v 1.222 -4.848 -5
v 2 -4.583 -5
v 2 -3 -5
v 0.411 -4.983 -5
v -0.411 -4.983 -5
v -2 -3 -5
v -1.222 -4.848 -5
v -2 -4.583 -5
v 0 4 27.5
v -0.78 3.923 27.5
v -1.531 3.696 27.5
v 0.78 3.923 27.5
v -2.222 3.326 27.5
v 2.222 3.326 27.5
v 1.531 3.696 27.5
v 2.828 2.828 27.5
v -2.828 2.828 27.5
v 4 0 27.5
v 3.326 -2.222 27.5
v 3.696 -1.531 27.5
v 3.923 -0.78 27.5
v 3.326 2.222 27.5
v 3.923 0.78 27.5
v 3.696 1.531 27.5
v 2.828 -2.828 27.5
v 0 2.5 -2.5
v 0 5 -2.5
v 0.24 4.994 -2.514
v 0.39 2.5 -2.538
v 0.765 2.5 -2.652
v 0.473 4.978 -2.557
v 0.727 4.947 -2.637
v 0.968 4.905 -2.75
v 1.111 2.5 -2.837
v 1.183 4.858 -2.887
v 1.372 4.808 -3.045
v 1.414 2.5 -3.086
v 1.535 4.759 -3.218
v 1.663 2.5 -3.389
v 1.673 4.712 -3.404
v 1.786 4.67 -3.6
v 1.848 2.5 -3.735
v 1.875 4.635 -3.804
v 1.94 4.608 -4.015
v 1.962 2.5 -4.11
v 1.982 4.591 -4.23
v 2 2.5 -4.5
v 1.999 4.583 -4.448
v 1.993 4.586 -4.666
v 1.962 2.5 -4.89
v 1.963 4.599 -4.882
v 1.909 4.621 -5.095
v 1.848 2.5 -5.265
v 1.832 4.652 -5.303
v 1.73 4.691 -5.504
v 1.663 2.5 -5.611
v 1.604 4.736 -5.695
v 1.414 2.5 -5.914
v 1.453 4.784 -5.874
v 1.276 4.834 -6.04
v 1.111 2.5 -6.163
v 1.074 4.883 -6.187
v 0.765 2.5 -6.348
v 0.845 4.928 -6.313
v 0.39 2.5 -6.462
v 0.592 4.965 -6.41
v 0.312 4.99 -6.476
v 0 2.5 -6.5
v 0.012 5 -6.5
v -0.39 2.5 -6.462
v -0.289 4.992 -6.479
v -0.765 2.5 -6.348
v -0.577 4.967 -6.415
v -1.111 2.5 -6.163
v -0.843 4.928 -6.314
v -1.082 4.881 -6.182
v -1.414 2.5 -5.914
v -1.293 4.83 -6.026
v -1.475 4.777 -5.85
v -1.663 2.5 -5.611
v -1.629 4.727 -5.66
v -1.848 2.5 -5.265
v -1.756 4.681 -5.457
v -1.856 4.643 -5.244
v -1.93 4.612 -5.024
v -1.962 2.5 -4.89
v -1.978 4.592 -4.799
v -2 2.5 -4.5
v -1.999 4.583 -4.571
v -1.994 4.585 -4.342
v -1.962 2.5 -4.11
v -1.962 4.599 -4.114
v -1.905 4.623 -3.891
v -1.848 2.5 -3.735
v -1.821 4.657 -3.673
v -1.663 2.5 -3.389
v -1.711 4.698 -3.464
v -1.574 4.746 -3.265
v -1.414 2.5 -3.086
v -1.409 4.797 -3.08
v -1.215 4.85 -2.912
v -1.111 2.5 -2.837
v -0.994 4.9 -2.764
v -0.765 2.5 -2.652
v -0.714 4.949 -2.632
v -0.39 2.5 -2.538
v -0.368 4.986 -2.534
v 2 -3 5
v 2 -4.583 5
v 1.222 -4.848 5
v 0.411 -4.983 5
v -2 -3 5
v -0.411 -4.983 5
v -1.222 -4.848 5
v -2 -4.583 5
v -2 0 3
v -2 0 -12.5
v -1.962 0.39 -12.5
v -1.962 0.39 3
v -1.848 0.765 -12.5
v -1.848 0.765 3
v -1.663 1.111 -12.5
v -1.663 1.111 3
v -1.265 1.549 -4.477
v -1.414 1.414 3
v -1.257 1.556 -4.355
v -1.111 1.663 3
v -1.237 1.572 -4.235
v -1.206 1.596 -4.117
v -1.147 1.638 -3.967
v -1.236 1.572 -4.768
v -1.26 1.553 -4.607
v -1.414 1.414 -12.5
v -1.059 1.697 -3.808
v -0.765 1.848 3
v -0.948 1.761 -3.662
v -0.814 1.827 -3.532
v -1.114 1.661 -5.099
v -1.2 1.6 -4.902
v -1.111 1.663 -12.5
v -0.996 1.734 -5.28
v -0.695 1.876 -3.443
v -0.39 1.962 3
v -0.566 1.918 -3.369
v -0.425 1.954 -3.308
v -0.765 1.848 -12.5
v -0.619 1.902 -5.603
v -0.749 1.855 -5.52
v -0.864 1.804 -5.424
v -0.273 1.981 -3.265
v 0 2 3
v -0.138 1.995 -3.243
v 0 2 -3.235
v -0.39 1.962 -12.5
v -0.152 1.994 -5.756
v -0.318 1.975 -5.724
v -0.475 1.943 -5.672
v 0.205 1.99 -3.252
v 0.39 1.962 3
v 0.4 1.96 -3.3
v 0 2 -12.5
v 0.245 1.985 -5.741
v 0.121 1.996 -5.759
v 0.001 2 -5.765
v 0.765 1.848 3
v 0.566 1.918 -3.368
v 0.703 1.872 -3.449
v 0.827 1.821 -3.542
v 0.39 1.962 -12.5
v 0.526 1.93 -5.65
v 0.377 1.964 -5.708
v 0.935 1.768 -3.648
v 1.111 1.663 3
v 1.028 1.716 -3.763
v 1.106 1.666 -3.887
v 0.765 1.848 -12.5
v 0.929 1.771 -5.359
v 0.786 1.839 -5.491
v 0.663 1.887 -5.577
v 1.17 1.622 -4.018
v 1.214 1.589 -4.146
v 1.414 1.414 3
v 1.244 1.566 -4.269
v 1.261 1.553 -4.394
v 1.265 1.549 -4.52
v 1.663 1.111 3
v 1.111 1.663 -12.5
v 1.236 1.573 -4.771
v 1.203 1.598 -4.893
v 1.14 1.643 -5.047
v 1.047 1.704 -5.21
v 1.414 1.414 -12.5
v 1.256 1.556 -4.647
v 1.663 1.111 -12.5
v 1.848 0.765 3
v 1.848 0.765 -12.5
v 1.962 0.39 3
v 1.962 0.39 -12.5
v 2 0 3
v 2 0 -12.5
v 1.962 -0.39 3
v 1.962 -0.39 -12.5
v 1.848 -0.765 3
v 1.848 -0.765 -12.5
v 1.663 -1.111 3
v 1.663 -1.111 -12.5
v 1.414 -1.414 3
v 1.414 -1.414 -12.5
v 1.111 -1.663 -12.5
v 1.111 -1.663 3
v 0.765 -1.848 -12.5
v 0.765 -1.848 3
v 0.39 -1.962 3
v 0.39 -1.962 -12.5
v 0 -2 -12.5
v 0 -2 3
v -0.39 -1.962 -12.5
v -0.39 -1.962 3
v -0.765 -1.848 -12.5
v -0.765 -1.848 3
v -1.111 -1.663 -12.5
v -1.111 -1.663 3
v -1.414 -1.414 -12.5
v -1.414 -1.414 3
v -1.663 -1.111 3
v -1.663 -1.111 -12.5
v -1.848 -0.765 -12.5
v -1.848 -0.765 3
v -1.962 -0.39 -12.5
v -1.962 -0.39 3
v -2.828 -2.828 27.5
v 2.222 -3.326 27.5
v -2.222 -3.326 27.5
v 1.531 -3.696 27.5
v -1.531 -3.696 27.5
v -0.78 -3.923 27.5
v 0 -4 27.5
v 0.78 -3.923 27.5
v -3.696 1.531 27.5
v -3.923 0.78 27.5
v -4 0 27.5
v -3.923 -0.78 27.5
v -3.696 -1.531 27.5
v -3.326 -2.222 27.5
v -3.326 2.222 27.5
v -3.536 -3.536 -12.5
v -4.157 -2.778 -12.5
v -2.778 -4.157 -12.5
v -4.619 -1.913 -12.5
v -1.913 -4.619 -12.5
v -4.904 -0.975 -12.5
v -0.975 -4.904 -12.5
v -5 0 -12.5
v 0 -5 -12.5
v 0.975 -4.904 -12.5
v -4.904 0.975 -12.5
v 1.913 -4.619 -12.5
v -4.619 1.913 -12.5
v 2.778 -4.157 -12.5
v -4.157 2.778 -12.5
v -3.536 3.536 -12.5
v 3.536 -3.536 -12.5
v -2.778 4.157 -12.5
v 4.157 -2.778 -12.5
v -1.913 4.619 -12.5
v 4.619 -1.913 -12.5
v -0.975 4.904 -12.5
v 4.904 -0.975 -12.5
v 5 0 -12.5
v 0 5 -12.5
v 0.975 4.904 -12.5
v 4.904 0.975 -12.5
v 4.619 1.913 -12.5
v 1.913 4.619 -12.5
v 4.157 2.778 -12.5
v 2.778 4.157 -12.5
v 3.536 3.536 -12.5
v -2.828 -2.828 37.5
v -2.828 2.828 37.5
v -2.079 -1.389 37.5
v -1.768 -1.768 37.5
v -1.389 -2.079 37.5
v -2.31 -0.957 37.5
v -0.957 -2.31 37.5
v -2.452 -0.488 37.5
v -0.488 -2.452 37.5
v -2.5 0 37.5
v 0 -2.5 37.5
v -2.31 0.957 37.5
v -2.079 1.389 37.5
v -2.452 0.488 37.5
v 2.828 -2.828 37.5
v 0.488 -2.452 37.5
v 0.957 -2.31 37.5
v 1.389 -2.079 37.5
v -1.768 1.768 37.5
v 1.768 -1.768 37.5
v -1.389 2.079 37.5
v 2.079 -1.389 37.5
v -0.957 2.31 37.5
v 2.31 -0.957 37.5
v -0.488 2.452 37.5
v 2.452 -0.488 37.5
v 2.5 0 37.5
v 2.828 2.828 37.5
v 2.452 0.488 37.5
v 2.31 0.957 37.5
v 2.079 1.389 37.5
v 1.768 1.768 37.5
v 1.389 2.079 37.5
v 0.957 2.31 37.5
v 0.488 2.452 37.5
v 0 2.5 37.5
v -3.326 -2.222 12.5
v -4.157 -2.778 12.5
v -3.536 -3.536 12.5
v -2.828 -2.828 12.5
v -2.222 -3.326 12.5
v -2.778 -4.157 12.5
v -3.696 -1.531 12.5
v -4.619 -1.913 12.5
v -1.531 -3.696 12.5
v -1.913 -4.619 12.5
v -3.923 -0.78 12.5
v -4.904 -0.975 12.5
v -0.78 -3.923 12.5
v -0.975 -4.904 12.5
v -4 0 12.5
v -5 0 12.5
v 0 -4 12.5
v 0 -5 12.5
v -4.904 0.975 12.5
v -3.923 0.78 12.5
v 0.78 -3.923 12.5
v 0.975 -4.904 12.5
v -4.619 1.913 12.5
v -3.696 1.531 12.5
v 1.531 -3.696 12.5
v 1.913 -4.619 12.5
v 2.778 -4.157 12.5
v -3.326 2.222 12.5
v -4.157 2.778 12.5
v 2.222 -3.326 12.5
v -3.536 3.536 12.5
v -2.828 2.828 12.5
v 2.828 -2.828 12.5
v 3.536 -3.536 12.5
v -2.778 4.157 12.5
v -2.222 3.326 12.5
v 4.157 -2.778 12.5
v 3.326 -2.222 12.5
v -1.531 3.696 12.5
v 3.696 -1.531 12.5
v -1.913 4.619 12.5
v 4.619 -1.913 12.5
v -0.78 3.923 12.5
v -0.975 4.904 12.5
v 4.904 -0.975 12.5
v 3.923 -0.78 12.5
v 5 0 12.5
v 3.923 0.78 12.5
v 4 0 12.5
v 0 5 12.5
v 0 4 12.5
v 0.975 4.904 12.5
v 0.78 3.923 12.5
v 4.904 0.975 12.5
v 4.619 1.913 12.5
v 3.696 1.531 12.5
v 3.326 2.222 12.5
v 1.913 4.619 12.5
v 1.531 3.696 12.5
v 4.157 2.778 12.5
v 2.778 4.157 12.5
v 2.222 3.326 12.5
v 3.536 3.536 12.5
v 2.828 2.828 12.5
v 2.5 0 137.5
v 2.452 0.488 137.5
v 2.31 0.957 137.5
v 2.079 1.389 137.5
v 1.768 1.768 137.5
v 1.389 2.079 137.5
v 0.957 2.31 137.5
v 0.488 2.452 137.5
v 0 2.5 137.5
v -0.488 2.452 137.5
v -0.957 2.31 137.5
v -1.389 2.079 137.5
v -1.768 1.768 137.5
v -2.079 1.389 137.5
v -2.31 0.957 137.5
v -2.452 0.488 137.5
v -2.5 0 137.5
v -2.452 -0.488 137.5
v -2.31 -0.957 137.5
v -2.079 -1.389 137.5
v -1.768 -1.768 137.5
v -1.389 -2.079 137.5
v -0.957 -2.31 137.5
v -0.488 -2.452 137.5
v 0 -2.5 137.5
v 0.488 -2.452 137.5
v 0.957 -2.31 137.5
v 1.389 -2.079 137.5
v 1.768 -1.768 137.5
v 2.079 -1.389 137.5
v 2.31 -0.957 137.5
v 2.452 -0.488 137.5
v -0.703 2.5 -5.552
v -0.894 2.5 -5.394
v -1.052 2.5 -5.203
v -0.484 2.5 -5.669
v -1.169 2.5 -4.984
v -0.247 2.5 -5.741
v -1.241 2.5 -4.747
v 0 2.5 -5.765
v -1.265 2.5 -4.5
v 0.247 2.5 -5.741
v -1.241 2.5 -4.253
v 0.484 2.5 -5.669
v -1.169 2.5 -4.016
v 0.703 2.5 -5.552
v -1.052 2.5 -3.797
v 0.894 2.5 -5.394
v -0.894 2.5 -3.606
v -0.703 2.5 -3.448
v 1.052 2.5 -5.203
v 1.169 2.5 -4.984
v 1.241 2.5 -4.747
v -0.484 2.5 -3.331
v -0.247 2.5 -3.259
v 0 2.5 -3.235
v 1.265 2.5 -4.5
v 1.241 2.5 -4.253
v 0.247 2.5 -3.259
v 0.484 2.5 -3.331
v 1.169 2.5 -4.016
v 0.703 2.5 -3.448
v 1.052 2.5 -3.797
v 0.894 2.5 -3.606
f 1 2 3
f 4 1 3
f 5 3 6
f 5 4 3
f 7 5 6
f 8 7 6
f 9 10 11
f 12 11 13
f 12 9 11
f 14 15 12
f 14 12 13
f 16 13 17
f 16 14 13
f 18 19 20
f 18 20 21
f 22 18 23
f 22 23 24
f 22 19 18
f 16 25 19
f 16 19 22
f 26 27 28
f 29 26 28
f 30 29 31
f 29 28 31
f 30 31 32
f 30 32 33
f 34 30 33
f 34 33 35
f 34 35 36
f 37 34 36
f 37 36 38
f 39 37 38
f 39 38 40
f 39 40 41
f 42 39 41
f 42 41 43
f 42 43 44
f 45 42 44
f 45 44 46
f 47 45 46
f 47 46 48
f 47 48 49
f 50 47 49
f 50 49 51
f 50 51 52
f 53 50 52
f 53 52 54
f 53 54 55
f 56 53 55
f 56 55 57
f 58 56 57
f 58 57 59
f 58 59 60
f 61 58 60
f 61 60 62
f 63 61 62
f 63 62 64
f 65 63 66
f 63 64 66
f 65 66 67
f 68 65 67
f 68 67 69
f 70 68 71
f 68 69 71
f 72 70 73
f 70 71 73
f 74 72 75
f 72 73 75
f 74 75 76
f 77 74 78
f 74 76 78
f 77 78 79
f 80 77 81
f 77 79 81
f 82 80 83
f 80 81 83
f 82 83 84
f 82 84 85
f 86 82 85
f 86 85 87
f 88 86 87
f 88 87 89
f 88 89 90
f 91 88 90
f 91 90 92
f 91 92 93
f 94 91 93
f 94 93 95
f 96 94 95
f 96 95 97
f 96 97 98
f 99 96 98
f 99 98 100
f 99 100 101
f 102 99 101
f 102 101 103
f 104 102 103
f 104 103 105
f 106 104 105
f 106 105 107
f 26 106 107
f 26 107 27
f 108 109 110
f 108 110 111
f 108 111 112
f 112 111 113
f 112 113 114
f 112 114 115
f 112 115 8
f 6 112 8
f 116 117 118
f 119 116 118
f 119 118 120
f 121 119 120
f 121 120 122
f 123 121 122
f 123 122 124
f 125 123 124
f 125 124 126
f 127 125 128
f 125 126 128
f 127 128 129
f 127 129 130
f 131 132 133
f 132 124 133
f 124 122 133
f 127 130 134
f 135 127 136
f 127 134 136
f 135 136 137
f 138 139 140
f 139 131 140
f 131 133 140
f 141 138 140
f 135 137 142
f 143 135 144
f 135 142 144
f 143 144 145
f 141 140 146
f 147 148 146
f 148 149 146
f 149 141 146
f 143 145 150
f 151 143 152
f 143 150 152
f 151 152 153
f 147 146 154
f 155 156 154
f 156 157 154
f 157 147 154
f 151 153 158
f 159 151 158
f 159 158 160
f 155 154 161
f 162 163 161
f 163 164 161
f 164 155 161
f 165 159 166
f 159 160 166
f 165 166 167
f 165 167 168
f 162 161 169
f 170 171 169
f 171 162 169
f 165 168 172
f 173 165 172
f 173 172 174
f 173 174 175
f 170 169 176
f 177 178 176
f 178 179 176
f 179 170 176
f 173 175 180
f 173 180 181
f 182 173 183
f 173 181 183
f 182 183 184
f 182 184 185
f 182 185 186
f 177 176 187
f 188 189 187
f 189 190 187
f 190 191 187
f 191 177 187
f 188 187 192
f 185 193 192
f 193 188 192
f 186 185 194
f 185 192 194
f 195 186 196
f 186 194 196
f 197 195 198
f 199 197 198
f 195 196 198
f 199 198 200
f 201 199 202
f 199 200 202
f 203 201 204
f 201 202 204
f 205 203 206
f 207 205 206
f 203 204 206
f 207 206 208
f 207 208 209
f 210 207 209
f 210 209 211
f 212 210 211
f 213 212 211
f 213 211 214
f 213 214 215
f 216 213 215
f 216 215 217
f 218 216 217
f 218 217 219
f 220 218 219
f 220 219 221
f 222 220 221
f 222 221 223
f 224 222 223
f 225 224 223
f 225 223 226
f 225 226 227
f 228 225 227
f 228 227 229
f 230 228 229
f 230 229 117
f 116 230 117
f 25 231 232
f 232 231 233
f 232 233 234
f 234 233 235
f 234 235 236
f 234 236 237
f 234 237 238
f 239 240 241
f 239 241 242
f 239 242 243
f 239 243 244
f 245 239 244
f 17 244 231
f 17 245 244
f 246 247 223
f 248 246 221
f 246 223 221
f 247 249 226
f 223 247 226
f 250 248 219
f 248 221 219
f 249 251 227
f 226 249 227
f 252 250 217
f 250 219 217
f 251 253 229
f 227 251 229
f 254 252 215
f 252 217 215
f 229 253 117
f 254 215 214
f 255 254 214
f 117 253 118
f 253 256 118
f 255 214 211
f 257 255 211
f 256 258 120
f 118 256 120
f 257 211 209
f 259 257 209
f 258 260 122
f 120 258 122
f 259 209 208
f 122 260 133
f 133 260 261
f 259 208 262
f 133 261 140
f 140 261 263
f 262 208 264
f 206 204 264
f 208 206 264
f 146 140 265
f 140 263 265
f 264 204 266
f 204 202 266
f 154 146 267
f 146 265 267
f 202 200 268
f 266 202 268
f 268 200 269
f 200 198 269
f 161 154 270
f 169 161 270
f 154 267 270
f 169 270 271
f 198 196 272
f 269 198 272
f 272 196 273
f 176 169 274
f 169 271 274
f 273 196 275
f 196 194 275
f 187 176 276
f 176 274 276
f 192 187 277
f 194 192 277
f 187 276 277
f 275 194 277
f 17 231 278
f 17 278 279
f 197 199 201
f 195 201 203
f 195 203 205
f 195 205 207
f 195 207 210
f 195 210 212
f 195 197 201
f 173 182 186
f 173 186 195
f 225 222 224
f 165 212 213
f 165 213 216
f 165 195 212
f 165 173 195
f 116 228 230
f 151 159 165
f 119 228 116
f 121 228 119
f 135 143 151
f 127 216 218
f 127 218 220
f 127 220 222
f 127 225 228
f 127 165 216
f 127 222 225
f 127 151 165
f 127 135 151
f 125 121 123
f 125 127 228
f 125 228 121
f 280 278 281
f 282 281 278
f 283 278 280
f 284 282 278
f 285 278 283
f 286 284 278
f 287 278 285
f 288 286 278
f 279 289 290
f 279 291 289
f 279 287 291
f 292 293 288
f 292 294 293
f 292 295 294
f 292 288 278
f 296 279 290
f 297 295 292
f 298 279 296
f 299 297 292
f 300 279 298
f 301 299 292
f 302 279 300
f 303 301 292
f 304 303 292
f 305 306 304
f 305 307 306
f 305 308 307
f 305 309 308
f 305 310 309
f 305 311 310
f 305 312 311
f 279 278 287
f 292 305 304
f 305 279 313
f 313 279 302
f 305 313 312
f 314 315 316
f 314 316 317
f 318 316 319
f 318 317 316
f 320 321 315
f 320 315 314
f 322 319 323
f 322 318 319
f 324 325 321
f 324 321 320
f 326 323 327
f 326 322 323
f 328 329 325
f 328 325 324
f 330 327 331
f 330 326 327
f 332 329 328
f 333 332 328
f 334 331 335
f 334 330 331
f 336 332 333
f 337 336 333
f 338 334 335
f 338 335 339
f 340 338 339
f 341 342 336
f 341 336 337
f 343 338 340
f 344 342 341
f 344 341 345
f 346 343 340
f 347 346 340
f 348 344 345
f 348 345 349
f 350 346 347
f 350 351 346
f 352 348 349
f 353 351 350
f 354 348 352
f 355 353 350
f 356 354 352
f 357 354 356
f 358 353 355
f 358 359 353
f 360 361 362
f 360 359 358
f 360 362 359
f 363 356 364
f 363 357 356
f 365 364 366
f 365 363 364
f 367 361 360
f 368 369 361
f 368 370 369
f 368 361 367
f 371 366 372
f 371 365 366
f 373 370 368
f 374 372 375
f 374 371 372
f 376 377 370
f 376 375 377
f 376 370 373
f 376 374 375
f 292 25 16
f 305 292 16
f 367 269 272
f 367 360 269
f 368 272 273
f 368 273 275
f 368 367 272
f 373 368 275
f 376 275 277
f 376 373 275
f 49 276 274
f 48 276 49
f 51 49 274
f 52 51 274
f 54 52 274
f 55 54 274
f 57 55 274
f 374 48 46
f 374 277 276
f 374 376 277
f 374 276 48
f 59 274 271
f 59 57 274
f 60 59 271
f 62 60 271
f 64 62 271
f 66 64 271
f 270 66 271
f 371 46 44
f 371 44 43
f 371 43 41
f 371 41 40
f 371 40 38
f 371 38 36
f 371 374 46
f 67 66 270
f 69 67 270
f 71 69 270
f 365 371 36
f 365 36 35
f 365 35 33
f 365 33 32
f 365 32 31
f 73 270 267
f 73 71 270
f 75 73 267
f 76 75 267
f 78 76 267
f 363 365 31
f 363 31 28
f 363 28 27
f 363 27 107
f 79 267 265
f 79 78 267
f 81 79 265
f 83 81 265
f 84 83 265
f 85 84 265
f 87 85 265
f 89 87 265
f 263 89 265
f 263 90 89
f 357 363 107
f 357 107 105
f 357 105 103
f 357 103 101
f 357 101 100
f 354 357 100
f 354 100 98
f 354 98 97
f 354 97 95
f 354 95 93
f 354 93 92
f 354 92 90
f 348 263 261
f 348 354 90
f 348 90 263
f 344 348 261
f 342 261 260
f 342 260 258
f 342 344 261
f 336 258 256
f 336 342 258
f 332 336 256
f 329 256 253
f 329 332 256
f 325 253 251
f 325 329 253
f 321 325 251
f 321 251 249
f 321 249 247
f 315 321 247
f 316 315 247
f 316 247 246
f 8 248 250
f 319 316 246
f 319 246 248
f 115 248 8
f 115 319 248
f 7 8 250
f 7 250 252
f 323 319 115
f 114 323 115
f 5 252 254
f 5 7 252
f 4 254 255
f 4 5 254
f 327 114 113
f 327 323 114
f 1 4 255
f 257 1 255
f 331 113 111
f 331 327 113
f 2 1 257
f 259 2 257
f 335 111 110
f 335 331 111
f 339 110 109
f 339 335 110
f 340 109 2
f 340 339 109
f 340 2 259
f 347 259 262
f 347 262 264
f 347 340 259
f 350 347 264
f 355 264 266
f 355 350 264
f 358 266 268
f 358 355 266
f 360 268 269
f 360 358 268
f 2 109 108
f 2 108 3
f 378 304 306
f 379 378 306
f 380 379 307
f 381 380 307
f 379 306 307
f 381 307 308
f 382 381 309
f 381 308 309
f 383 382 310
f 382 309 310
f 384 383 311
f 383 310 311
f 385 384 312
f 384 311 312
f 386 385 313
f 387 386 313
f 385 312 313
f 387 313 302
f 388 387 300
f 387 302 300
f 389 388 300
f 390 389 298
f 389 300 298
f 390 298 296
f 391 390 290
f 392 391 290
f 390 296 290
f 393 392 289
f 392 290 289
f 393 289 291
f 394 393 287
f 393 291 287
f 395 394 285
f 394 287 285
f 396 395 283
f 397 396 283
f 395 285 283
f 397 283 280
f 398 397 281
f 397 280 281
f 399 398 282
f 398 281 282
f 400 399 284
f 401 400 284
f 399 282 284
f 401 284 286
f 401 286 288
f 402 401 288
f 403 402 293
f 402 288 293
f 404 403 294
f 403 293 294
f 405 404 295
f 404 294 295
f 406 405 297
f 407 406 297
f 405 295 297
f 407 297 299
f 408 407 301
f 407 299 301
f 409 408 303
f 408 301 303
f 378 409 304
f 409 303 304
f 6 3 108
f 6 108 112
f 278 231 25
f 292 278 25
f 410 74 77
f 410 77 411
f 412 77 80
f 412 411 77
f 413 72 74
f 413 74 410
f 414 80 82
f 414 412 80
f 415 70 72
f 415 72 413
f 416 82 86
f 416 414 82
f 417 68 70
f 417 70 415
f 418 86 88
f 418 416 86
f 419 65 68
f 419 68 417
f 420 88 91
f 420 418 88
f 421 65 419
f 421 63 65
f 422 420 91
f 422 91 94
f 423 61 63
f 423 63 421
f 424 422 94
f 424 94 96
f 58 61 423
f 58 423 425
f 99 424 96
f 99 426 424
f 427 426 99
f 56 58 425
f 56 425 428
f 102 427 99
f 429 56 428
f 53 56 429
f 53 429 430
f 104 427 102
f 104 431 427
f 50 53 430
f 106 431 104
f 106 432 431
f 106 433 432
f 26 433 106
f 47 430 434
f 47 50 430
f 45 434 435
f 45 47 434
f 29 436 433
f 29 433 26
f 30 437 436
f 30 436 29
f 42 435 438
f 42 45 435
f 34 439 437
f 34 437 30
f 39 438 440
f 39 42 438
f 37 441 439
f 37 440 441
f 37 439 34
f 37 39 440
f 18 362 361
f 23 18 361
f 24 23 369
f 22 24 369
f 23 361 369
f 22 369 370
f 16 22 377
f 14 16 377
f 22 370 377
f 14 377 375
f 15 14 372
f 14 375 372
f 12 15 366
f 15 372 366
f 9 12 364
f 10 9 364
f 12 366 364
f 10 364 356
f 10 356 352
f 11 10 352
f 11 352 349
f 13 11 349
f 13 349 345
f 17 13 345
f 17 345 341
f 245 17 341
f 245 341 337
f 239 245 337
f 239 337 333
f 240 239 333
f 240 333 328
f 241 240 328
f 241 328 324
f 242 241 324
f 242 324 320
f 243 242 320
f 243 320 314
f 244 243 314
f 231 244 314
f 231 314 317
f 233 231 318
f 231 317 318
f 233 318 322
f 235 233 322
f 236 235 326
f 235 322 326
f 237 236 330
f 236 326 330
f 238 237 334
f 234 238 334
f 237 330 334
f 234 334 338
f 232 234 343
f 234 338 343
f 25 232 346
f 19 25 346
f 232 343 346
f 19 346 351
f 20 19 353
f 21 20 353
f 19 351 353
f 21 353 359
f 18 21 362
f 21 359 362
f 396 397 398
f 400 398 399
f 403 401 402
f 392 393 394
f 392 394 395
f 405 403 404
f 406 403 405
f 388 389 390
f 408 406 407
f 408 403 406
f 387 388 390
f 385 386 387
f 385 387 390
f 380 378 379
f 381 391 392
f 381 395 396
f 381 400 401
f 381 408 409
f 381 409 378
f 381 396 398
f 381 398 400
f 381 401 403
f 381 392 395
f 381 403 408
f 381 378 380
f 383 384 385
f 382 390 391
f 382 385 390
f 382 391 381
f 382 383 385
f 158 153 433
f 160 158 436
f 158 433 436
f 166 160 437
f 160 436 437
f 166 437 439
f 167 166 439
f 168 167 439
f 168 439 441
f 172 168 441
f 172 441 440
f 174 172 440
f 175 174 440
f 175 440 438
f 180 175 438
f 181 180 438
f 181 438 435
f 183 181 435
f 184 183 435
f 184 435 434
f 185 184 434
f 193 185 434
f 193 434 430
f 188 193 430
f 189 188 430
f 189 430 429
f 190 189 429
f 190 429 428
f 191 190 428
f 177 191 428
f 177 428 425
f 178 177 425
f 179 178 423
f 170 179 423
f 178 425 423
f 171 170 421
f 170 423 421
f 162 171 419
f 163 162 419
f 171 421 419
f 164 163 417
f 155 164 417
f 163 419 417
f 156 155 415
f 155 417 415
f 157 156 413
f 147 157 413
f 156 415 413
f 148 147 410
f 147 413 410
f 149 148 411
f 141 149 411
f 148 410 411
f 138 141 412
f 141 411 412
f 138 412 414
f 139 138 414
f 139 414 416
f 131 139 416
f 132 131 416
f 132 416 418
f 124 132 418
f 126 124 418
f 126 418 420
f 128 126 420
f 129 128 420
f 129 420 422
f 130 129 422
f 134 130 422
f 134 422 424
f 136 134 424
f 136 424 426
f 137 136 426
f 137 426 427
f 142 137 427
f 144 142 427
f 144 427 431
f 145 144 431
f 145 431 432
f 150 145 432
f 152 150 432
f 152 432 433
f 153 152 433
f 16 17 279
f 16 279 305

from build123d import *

# Parameters (mm, degrees)
CROQUIS1_R                 = 5
SALIENTE_EXTRUIR1_DEPTH    = 12.5
CROQUIS2_R                 = 2
CORTAR_EXTRUIR1_DEPTH      = 15.5
CROQUIS3_R                 = 2
CORTAR_EXTRUIR2_DEPTH      = 2.5
CROQUIS4_R                 = 4
SALIENTE_EXTRUIR2_DEPTH    = 15
CROQUIS5_W                 = 5.65685425
CROQUIS5_H                 = 5.65685425
SALIENTE_EXTRUIR3_DEPTH    = 10
CORTAR_EXTRUIR3_REACH      = 40.568
CORTAR_EXTRUIR3_END_RADIUS = 2
CROQUIS6_R                 = 1.265
CROQUIS7_W                 = 4
CROQUIS7_H                 = 10
CORTAR_EXTRUIR4_DEPTH      = 2
CROQUIS8_R                 = 2.5
SALIENTE_EXTRUIR4_DEPTH    = 100


with BuildPart() as part:
    # Croquis1 → Saliente-Extruir1 (new, symmetric)
    with BuildSketch(Plane.XY):
        Circle(CROQUIS1_R)
    extrude(amount=SALIENTE_EXTRUIR1_DEPTH, both=True)

    # Croquis2 → Cortar-Extruir1 (cut)
    with BuildSketch(Plane(origin=(0, 0, -12.5), x_dir=(-1, 0, 0), z_dir=(0, 0, -1))):
        Circle(CROQUIS2_R)
    extrude(amount=-CORTAR_EXTRUIR1_DEPTH, mode=Mode.SUBTRACT)

    # Croquis3 → Cortar-Extruir2 (cut)
    with BuildSketch(Plane(origin=(0, 5, 0), x_dir=(1, 0, 0), z_dir=(0, 1, 0))):
        with Locations(Location((0, 4.5, 0), (0, 0, 270))):
            Circle(CROQUIS3_R)
    extrude(amount=-CORTAR_EXTRUIR2_DEPTH, mode=Mode.SUBTRACT)

    # Croquis4 → Saliente-Extruir2 (add)
    with BuildSketch(Plane.XY.offset(12.5)):
        Circle(CROQUIS4_R)
    extrude(amount=SALIENTE_EXTRUIR2_DEPTH)

    # Croquis5 → Saliente-Extruir3 (add)
    with BuildSketch(Plane.XY.offset(27.5)):
        Rectangle(CROQUIS5_W, CROQUIS5_H)
    extrude(amount=SALIENTE_EXTRUIR3_DEPTH)

    # Cortar-Extruir3: up to this cylinder (the profile starts outside it)
    cortar_extruir3_end = Plane(origin=(0, 0, -4.5), z_dir=(0, 0, -1)) * Cylinder(CORTAR_EXTRUIR3_END_RADIUS, 86.136, mode=Mode.PRIVATE)
    # Croquis6 → Cortar-Extruir3 (cut, up to the surface)
    with BuildSketch(Plane(origin=(0, 2.5, 0), x_dir=(1, 0, 0), z_dir=(0, 1, 0)), mode=Mode.PRIVATE) as cortar_extruir3_sk1:
        with Locations(Location((0, 4.5, 0), (0, 0, 270))):
            Circle(CROQUIS6_R)
    cortar_extruir3_tool1 = extrude(cortar_extruir3_sk1.sketch, amount=-CORTAR_EXTRUIR3_REACH, mode=Mode.PRIVATE) - cortar_extruir3_end
    add(cortar_extruir3_tool1.solids().sort_by_distance((0, 2.5, -4.5))[0], mode=Mode.SUBTRACT)

    # Croquis7 → Cortar-Extruir4 (cut)
    with BuildSketch(Plane(origin=(0, -5, 0), x_dir=(-1, 0, 0), z_dir=(0, -1, 0))):
        Rectangle(CROQUIS7_W, CROQUIS7_H)
    extrude(amount=-CORTAR_EXTRUIR4_DEPTH, mode=Mode.SUBTRACT)

    # Croquis8 → Saliente-Extruir4 (add)
    with BuildSketch(Plane.XY.offset(37.5)):
        Circle(CROQUIS8_R)
    extrude(amount=SALIENTE_EXTRUIR4_DEPTH)


solid = part.part
